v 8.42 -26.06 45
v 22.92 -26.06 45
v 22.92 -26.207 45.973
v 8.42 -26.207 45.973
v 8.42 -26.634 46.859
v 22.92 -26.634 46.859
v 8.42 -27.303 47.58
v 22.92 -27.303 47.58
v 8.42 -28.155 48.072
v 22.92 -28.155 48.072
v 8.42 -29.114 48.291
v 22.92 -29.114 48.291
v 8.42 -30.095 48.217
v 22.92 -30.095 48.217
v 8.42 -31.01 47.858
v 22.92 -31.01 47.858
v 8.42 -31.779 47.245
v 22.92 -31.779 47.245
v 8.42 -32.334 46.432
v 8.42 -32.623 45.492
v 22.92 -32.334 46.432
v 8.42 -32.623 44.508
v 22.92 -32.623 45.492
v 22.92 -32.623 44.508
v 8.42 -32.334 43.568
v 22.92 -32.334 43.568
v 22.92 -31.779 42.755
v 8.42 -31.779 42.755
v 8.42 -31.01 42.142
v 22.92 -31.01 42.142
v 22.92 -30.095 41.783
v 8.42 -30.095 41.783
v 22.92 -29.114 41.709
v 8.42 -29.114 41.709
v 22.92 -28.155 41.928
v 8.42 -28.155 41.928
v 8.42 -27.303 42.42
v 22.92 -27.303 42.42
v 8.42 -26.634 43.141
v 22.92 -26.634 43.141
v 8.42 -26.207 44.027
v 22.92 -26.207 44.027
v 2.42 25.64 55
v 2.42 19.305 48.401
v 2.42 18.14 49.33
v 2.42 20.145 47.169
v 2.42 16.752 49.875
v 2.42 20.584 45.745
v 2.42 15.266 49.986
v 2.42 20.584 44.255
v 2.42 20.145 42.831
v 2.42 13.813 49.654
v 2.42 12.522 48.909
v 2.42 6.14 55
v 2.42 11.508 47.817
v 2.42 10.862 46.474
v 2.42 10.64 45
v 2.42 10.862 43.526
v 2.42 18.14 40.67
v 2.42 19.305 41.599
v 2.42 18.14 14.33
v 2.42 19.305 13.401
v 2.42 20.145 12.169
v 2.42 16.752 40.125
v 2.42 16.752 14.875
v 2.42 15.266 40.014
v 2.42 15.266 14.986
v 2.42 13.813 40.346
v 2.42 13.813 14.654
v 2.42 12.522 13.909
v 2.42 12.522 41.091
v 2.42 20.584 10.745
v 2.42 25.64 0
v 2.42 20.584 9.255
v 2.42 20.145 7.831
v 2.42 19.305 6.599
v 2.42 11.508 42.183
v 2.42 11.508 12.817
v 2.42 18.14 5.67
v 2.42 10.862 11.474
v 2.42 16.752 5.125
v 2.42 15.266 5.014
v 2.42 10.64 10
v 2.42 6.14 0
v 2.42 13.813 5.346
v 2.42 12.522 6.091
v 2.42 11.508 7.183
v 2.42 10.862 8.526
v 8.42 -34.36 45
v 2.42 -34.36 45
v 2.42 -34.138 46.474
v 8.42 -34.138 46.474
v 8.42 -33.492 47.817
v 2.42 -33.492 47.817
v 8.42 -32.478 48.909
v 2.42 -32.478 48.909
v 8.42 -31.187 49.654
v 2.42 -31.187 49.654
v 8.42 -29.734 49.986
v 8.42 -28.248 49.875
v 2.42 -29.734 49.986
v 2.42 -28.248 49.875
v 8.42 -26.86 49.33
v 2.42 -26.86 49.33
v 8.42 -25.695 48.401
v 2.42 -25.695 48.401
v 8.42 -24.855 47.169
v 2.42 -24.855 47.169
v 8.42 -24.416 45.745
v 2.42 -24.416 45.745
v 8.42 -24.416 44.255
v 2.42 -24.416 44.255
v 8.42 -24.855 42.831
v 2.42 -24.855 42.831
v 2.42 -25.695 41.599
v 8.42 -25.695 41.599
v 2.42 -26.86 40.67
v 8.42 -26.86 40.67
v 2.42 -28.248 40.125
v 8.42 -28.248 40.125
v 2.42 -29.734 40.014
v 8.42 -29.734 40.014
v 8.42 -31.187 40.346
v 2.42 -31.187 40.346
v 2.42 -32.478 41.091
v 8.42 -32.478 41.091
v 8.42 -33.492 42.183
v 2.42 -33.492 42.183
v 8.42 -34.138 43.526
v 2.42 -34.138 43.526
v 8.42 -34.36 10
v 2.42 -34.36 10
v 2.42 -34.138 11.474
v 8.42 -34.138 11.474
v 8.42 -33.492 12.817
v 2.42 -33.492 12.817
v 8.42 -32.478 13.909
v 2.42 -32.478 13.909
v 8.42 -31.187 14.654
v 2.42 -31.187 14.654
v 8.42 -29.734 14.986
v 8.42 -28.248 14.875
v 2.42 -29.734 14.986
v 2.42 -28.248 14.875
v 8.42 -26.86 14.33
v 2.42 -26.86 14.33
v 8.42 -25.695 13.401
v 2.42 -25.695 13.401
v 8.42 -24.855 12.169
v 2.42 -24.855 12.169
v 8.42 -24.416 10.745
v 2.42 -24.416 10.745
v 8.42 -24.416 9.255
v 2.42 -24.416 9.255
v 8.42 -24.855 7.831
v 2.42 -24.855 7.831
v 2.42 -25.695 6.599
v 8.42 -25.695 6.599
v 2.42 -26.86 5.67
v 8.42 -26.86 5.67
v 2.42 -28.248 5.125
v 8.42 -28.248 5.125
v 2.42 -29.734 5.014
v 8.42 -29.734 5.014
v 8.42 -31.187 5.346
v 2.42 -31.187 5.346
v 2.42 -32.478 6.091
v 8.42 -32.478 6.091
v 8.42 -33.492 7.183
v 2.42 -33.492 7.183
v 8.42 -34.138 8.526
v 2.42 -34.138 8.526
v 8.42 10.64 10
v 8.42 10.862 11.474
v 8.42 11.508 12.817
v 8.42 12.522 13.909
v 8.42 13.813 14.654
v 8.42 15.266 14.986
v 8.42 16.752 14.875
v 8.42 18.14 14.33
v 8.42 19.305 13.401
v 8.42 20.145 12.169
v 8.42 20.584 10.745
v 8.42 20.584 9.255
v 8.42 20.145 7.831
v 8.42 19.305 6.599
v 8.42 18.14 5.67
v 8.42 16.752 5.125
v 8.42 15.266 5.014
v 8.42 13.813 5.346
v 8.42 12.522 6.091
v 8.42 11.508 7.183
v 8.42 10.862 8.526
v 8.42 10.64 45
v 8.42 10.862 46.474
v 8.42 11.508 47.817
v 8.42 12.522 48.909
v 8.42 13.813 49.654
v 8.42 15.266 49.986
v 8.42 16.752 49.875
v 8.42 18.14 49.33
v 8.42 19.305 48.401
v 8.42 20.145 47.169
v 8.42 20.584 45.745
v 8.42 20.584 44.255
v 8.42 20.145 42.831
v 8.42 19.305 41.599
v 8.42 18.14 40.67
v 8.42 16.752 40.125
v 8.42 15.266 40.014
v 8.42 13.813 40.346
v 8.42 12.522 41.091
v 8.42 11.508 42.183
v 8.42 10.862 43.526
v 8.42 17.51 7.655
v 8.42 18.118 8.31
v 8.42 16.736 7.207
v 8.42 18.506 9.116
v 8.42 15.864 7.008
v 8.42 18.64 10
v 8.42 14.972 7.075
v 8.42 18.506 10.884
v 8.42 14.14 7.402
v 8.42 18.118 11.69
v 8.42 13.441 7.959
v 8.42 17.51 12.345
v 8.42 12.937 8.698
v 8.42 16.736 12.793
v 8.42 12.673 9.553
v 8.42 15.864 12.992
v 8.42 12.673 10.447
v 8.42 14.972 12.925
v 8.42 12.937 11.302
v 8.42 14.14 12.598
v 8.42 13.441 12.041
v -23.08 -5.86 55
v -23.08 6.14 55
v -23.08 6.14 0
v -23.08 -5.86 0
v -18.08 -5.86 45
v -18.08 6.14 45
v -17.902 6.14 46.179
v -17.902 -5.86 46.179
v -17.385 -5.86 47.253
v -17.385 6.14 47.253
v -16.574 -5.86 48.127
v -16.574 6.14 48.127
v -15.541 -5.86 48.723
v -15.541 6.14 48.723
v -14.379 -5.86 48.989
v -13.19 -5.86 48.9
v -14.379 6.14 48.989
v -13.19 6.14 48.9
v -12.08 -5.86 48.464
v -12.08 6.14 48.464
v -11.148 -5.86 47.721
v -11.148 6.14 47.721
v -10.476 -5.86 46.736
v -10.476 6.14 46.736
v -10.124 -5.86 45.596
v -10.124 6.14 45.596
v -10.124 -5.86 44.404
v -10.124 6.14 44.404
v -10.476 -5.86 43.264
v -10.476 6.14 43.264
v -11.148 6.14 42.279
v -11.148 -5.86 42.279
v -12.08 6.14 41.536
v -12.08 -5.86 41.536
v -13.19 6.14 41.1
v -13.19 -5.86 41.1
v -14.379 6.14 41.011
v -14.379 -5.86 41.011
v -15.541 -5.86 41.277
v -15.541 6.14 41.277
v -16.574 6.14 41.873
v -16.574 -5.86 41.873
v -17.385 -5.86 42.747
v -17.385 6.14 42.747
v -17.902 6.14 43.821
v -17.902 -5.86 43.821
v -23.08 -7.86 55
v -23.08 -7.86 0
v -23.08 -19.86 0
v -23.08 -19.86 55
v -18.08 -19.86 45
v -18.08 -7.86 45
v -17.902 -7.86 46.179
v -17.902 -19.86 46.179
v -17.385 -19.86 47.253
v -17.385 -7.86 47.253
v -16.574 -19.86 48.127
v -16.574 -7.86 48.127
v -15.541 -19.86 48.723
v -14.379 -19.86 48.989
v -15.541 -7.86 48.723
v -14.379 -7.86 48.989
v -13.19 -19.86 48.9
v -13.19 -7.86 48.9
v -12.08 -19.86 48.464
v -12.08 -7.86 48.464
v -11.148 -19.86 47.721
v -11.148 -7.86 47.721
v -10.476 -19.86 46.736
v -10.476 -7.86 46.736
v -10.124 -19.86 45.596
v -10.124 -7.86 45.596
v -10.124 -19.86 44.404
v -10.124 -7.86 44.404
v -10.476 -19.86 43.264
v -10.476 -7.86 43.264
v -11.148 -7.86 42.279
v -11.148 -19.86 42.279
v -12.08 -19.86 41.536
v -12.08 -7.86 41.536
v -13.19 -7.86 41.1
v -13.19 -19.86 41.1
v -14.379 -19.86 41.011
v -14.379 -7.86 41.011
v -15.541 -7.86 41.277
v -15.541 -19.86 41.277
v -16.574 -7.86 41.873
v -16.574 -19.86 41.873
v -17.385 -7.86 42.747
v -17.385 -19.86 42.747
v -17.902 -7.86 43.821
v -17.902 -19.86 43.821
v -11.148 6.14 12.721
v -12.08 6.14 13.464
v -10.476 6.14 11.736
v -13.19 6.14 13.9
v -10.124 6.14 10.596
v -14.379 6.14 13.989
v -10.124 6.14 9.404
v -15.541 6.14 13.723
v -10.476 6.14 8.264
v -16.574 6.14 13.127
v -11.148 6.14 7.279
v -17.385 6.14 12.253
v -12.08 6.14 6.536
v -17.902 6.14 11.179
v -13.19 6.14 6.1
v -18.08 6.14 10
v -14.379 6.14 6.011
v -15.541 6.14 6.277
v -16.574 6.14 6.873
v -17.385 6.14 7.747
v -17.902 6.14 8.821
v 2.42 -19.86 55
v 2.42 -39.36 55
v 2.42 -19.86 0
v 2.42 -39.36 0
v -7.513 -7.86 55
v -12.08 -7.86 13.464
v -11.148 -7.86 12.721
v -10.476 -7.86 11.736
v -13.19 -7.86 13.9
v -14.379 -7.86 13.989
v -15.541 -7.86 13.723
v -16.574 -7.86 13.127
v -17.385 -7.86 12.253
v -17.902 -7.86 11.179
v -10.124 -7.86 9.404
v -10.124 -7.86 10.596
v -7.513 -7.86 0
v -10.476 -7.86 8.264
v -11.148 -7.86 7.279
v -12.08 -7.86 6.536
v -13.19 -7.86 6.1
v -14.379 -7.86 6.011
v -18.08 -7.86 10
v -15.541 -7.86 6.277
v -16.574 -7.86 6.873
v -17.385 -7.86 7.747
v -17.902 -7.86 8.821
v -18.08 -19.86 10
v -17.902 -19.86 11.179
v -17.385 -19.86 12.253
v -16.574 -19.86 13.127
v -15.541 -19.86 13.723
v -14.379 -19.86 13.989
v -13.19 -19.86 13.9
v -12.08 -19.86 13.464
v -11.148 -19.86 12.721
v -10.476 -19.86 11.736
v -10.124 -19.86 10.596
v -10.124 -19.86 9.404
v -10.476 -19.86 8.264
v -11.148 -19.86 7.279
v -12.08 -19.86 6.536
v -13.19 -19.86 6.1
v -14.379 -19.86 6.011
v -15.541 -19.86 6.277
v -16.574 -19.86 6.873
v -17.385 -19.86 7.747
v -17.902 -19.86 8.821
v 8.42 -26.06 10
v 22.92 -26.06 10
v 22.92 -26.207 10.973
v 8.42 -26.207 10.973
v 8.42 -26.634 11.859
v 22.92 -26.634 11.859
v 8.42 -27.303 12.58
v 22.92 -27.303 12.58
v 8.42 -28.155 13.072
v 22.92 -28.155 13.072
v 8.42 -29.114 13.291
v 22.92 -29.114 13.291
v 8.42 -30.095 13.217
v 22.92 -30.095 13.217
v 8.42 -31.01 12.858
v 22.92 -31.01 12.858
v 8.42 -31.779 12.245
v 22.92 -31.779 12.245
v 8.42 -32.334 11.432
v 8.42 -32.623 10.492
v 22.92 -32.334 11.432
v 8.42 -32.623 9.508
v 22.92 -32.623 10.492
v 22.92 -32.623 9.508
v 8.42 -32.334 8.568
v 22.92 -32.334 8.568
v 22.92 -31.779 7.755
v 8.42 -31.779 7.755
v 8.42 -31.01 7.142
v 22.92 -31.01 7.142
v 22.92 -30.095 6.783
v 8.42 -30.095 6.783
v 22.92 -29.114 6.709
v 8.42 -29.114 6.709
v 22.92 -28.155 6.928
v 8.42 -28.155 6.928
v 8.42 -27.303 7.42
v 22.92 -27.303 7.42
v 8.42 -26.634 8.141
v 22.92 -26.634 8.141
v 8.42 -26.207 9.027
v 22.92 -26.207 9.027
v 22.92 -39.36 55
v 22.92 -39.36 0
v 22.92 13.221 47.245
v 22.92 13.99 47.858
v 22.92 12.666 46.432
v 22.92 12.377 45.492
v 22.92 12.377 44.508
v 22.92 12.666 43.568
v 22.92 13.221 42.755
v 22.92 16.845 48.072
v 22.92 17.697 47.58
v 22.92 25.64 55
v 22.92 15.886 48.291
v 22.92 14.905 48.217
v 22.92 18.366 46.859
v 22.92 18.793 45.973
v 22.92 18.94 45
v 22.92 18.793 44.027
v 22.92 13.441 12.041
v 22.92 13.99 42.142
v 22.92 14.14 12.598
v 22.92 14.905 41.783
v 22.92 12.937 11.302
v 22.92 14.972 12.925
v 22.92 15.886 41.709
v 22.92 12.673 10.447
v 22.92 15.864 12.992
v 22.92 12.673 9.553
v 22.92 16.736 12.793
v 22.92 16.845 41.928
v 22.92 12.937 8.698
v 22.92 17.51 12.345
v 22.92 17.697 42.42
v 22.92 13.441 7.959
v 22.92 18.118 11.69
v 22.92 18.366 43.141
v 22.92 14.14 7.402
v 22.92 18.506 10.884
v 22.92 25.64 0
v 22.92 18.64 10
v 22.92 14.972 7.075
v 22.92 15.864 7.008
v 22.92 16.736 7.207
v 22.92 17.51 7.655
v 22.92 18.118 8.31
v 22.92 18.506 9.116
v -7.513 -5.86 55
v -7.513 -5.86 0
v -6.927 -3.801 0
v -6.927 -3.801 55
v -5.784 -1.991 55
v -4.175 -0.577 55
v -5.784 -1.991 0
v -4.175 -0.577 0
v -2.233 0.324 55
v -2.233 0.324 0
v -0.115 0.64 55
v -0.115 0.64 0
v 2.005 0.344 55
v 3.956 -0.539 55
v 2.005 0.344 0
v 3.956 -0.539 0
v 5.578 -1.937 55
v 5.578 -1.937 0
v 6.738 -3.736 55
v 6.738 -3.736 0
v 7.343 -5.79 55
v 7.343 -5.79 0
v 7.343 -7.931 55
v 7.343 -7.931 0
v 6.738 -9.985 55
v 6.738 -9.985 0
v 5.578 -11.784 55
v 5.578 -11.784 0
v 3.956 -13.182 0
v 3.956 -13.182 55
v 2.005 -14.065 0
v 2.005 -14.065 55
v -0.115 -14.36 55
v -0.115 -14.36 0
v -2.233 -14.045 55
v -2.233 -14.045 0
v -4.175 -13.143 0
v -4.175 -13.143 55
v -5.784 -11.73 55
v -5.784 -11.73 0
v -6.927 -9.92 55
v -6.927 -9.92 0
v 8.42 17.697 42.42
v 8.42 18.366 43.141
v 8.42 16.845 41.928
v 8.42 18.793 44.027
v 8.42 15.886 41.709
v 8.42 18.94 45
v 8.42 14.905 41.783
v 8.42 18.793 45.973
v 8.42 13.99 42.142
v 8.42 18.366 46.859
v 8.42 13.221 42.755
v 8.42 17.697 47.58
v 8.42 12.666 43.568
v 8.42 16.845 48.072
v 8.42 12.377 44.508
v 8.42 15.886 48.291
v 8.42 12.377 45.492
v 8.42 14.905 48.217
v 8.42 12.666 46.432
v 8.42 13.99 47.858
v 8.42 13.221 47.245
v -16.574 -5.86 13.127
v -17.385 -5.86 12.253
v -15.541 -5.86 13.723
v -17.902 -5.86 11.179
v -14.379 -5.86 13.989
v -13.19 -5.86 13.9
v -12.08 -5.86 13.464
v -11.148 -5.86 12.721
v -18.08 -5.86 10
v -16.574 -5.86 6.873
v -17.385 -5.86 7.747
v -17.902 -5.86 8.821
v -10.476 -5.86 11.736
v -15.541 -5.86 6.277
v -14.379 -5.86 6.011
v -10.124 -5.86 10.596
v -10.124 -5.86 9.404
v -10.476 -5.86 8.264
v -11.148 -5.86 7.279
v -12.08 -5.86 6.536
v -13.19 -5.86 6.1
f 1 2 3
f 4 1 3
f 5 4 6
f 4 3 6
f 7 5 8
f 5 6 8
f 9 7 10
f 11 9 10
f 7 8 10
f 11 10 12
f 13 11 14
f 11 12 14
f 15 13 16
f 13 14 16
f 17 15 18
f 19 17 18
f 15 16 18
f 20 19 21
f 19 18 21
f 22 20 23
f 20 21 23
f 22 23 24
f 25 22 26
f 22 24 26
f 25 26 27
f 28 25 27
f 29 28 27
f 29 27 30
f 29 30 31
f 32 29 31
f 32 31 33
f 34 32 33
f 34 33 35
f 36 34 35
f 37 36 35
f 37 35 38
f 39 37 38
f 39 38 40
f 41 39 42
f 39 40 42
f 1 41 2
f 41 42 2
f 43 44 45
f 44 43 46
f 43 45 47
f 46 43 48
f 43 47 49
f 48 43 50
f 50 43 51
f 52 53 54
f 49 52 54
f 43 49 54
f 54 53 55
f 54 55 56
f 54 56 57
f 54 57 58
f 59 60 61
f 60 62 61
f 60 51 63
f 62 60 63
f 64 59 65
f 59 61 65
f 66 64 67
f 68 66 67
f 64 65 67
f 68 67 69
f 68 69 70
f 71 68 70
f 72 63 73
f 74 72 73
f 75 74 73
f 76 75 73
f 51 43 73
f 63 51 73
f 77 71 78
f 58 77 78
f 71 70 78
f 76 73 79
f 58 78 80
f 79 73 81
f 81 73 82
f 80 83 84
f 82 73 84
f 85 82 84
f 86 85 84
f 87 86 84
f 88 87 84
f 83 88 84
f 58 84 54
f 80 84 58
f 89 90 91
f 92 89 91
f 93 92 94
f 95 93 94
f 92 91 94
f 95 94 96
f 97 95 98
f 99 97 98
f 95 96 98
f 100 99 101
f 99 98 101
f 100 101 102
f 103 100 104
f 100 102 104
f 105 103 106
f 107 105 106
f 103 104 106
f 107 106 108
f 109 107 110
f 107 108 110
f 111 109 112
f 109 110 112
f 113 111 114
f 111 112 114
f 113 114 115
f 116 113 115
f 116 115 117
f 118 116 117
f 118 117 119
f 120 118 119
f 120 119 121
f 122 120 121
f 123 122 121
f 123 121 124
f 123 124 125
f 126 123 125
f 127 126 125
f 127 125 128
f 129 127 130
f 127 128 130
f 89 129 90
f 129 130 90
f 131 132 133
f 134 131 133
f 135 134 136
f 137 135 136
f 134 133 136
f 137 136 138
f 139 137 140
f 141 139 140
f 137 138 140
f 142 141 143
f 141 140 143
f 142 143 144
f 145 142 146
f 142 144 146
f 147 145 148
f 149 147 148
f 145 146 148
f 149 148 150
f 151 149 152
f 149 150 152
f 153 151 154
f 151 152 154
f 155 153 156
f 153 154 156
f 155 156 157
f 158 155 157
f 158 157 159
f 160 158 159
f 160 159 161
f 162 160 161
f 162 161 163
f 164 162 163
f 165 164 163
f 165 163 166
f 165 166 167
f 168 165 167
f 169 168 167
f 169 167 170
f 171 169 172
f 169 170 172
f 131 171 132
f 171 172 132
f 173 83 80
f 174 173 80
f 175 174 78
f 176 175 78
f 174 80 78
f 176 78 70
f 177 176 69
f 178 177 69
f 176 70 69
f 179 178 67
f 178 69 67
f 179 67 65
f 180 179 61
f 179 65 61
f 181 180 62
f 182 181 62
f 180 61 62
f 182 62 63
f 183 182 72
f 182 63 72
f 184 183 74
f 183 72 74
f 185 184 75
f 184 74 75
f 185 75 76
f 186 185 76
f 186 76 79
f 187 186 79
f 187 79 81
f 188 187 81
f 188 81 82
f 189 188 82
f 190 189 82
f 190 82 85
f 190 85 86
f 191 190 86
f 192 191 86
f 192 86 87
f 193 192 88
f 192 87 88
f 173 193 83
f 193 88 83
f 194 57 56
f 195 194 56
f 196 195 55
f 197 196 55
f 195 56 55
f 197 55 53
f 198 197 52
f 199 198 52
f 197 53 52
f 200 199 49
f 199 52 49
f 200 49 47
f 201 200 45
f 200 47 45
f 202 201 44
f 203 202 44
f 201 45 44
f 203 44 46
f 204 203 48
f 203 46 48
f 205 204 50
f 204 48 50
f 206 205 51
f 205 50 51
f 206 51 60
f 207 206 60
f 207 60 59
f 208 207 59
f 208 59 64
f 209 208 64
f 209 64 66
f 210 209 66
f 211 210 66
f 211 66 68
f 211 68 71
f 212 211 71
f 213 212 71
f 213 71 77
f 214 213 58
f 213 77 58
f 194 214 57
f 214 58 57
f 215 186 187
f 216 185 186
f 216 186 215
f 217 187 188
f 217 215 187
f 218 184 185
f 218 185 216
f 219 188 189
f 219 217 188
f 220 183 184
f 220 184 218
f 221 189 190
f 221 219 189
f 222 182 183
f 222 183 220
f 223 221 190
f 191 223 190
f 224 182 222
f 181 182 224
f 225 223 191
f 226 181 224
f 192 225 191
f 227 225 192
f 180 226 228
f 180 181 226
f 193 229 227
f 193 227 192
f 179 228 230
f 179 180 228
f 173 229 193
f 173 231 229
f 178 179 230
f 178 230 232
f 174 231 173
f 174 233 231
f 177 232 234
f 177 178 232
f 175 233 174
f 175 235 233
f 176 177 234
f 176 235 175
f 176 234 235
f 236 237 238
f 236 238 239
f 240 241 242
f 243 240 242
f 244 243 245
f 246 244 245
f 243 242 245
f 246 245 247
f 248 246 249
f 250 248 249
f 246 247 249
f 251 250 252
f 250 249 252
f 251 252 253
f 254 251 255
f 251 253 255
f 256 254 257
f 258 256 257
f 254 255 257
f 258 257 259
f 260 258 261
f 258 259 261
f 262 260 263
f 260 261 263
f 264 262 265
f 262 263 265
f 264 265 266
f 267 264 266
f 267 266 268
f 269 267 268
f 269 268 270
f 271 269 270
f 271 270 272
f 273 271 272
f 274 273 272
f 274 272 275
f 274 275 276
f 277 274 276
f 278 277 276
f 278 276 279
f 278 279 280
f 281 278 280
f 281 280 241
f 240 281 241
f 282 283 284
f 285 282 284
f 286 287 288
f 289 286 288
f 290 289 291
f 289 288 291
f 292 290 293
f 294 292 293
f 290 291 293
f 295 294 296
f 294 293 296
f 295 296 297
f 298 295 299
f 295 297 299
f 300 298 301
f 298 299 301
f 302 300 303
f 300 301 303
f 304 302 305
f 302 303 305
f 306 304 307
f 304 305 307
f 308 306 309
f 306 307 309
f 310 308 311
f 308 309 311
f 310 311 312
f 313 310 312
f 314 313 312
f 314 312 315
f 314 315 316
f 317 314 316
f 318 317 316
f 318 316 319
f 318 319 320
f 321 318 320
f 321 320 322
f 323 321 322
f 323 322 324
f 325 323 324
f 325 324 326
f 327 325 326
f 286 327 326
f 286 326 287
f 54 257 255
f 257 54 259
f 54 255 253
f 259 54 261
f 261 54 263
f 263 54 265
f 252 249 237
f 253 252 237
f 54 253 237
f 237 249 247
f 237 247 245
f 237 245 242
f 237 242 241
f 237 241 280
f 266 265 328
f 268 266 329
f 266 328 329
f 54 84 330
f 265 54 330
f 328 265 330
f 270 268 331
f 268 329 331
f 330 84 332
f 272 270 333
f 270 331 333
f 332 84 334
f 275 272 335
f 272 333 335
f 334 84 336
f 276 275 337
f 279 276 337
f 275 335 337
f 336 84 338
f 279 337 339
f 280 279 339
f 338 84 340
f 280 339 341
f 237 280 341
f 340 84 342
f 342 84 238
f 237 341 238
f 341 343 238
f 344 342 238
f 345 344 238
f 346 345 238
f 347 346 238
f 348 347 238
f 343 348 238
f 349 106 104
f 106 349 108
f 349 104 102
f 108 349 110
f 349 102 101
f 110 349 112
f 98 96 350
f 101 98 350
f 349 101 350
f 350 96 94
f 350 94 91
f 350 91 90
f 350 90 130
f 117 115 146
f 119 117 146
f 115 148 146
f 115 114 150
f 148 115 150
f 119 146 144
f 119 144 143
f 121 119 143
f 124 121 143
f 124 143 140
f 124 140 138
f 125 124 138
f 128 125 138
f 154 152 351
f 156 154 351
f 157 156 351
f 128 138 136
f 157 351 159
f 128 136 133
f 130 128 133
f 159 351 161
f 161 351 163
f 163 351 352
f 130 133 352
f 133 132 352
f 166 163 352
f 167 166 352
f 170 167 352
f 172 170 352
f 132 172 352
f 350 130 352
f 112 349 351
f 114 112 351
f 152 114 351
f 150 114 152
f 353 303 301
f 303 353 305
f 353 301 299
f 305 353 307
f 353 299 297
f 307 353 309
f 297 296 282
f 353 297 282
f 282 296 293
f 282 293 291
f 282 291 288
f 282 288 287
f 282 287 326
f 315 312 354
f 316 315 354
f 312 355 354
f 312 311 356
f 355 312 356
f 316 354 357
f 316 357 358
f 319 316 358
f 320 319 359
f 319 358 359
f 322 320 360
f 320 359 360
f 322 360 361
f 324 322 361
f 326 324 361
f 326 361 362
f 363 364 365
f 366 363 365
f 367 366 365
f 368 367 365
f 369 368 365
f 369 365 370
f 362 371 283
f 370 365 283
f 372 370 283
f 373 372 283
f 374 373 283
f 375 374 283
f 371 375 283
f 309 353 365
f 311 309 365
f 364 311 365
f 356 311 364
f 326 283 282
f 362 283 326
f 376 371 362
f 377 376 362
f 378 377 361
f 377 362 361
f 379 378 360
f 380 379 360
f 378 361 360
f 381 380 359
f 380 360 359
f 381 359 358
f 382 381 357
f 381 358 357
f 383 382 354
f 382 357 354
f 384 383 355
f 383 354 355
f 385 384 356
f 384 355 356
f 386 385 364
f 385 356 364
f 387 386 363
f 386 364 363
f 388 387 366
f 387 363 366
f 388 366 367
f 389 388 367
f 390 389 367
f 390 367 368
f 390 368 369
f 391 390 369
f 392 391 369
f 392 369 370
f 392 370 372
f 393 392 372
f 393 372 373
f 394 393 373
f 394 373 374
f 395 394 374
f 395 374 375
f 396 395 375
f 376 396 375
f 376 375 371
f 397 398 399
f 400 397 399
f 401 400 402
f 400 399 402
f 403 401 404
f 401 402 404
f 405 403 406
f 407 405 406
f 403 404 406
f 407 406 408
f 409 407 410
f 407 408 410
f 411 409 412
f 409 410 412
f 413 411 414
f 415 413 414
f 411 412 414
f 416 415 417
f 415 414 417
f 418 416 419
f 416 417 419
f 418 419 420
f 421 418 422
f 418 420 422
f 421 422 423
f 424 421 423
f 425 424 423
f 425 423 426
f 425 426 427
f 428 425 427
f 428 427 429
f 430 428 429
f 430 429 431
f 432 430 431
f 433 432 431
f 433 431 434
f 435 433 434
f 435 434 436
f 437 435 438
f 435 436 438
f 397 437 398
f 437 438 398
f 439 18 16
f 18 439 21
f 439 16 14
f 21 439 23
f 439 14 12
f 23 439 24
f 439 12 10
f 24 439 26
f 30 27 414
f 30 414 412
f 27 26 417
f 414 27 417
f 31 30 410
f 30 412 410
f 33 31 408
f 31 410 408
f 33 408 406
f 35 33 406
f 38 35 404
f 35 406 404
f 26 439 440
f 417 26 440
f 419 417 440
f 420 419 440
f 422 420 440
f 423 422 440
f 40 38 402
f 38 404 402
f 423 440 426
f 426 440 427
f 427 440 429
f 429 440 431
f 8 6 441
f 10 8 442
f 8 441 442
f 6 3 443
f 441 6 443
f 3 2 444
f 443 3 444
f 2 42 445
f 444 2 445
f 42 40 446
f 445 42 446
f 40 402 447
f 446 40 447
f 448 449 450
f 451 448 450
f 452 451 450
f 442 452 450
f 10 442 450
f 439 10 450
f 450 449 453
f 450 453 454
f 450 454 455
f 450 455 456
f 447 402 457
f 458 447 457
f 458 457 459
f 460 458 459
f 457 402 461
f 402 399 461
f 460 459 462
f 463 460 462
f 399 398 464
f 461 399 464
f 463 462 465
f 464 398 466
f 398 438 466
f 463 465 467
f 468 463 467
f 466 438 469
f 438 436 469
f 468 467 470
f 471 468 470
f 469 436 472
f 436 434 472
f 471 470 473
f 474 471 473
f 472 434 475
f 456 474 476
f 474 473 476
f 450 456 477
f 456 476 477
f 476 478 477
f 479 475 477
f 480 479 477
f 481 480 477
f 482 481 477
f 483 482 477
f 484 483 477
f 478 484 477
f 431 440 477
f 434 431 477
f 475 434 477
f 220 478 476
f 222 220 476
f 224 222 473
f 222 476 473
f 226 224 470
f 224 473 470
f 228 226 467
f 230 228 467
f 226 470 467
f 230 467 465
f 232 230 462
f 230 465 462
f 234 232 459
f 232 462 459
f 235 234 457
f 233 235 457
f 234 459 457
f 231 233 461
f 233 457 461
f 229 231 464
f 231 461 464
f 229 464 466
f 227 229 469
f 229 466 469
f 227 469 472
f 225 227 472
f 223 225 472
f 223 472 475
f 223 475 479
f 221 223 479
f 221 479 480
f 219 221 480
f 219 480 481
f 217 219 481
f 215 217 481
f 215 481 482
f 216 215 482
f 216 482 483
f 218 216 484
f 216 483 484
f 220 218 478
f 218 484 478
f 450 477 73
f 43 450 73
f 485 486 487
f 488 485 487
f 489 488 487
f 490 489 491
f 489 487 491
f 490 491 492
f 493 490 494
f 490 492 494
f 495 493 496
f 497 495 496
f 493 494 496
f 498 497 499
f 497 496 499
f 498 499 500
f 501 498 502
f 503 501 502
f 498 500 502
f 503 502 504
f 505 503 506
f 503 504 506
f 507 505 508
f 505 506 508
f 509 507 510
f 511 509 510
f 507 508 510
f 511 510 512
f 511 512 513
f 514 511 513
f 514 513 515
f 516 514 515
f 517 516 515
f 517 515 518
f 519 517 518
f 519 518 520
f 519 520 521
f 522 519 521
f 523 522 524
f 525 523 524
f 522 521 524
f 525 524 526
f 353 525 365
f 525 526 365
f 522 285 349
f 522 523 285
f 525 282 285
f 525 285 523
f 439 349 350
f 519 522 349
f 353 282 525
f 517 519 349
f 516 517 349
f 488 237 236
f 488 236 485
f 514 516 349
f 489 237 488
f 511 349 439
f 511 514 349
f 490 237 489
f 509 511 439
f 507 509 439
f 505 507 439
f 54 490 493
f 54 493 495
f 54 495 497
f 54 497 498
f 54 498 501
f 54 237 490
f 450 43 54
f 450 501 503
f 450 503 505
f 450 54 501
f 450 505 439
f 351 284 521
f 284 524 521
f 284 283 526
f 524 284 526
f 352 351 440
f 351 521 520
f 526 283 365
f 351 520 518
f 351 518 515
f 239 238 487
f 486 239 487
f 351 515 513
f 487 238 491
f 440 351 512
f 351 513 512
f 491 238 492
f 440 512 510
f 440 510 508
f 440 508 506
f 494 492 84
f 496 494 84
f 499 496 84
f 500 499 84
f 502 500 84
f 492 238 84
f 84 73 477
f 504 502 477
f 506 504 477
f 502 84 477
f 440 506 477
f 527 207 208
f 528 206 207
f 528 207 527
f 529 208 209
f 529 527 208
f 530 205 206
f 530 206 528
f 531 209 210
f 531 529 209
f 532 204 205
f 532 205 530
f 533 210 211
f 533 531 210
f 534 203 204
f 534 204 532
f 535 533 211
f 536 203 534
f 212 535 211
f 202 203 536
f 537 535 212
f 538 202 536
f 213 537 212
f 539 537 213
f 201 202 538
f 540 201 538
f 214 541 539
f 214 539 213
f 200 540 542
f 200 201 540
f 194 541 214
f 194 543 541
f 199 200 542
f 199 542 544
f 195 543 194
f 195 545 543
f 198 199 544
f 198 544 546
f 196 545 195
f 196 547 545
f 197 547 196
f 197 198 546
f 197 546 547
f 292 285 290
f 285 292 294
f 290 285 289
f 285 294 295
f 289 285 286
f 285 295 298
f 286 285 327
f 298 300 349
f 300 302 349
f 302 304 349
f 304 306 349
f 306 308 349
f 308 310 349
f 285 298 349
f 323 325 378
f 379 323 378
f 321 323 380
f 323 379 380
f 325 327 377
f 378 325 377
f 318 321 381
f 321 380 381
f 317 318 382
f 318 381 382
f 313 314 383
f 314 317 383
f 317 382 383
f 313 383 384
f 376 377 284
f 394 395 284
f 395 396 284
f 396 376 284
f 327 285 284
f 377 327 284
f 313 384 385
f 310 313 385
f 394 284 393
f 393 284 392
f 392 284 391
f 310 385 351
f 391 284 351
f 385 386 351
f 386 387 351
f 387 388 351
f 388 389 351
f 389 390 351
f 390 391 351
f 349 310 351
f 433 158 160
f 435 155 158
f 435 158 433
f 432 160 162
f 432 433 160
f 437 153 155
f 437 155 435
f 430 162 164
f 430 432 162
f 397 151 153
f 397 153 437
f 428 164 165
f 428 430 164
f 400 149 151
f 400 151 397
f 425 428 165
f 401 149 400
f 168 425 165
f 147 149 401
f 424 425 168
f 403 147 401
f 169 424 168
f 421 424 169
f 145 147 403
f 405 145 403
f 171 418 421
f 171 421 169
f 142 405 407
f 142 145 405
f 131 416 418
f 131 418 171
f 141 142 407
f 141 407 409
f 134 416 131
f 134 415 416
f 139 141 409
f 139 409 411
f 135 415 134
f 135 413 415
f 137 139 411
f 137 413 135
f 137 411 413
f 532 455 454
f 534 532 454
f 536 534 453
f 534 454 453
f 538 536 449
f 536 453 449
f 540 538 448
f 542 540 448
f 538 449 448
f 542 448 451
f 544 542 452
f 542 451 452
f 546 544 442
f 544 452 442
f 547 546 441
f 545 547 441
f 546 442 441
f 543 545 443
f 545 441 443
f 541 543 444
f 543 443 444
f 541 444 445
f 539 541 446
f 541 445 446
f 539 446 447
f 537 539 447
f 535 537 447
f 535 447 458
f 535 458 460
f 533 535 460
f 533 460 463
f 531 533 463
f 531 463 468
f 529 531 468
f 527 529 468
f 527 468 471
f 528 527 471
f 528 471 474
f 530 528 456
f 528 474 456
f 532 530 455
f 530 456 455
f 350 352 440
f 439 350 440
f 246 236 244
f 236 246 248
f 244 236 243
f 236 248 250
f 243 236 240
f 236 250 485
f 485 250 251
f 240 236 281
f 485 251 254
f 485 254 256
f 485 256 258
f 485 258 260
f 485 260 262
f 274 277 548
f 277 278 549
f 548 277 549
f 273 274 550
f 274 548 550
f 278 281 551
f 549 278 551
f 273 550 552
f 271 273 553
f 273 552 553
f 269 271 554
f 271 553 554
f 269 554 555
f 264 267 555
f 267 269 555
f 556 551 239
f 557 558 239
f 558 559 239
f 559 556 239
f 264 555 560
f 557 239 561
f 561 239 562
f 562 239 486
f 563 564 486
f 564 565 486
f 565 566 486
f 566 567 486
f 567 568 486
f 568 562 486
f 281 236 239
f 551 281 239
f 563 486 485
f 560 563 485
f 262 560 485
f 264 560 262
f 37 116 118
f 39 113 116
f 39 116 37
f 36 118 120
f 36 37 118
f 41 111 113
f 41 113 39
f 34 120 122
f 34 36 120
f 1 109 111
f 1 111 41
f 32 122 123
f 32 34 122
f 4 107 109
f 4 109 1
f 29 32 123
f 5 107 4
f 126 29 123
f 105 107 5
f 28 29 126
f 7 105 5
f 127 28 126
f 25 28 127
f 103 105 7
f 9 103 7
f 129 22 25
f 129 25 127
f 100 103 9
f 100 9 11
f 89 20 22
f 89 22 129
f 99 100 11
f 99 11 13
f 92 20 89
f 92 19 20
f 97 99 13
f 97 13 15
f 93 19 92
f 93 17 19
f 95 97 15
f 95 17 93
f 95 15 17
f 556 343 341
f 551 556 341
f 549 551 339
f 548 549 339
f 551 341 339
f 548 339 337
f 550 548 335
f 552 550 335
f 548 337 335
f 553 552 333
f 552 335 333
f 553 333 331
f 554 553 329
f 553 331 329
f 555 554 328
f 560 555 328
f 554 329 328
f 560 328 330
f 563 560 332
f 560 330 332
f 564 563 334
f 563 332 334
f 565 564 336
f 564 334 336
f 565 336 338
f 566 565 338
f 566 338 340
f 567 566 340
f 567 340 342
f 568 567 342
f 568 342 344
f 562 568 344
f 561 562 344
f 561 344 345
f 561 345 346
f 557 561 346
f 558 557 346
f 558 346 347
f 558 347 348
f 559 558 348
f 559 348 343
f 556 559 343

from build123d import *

# Parameters (mm, degrees)
F1_DEPTH = 55
F2_R     = 4
F3_DEPTH = 60
F4_R     = 3.3
F4_R_2   = 3
F5_DEPTH = 14.5
F6_R     = 5
F7_DEPTH = 6
F8_R     = 5
F9_DEPTH = 6


with BuildPart() as f1:
    # F0 (on Top) → F1 (new body)
    with BuildSketch(Plane.XY):
        with BuildLine():
            Line((22.920288, 15.639662), (22.920288, 25.639662))
            Line((22.920288, 25.639662), (8.420288, 25.639662))
            Line((8.420288, 25.639662), (2.420288, 25.639662))
            Line((2.420288, 25.639662), (2.420288, 6.139662))
            Line((2.420288, 6.139662), (-23.079712, 6.139662))
            Line((-23.079712, 6.139662), (-23.079712, -5.860338))
            Line((-23.079712, -5.860338), (-7.512746, -5.860338))
            ThreePointArc((-7.512746, -5.860338), (7.420288, -6.860338), (-7.512746, -7.860338))
            Line((-7.512746, -7.860338), (-23.079712, -7.860338))
            Line((-23.079712, -7.860338), (-23.079712, -19.860338))
            Line((-23.079712, -19.860338), (-0.079712, -19.860338))
            Line((-0.079712, -19.860338), (2.420288, -19.860338))
            Line((2.420288, -19.860338), (2.420288, -39.360338))
            Line((2.420288, -39.360338), (22.920288, -39.360338))
            Line((22.920288, -39.360338), (22.920288, -29.360338))
            Line((22.920288, -29.360338), (22.920288, 15.639662))
        make_face()
    extrude(amount=F1_DEPTH)

    # F2 (on face) → F3 (cut)
    with BuildSketch(Plane(origin=(0, 6.139662, 0), x_dir=(-1, 0, 0), z_dir=(0, 1, 0))):
        with Locations((14.079712, 10)):
            Circle(F2_R)
        with Locations((14.079712, 45)):
            Circle(F2_R)
    extrude(amount=-F3_DEPTH, mode=Mode.SUBTRACT)

    # F4 (on face) → F5 (cut)
    with BuildSketch(Plane.YZ.offset(22.920288)):
        with Locations((-29.360338, 10)):
            Circle(F4_R)
        with Locations((15.639662, 10)):
            Circle(F4_R_2)
        with Locations((15.639662, 45)):
            Circle(F4_R)
        with Locations((-29.360338, 45)):
            Circle(F4_R)
    extrude(amount=-F5_DEPTH, mode=Mode.SUBTRACT)

    # F6 (on face) → F7 (cut)
    with BuildSketch(Plane(origin=(2.420288, 0, 0), x_dir=(0, -1, 0), z_dir=(-1, 0, 0))):
        with Locations((29.360338, 45)):
            Circle(F6_R)
        with Locations((29.360338, 10)):
            Circle(F6_R)
    extrude(amount=-F7_DEPTH, mode=Mode.SUBTRACT)

    # F8 (on face) → F9 (cut)
    with BuildSketch(Plane(origin=(2.420288, 0, 0), x_dir=(0, -1, 0), z_dir=(-1, 0, 0))):
        with Locations((-15.639662, 45)):
            Circle(F8_R)
        with Locations((-15.639662, 10)):
            Circle(F8_R)
    extrude(amount=-F9_DEPTH, mode=Mode.SUBTRACT)


solid = f1.part
